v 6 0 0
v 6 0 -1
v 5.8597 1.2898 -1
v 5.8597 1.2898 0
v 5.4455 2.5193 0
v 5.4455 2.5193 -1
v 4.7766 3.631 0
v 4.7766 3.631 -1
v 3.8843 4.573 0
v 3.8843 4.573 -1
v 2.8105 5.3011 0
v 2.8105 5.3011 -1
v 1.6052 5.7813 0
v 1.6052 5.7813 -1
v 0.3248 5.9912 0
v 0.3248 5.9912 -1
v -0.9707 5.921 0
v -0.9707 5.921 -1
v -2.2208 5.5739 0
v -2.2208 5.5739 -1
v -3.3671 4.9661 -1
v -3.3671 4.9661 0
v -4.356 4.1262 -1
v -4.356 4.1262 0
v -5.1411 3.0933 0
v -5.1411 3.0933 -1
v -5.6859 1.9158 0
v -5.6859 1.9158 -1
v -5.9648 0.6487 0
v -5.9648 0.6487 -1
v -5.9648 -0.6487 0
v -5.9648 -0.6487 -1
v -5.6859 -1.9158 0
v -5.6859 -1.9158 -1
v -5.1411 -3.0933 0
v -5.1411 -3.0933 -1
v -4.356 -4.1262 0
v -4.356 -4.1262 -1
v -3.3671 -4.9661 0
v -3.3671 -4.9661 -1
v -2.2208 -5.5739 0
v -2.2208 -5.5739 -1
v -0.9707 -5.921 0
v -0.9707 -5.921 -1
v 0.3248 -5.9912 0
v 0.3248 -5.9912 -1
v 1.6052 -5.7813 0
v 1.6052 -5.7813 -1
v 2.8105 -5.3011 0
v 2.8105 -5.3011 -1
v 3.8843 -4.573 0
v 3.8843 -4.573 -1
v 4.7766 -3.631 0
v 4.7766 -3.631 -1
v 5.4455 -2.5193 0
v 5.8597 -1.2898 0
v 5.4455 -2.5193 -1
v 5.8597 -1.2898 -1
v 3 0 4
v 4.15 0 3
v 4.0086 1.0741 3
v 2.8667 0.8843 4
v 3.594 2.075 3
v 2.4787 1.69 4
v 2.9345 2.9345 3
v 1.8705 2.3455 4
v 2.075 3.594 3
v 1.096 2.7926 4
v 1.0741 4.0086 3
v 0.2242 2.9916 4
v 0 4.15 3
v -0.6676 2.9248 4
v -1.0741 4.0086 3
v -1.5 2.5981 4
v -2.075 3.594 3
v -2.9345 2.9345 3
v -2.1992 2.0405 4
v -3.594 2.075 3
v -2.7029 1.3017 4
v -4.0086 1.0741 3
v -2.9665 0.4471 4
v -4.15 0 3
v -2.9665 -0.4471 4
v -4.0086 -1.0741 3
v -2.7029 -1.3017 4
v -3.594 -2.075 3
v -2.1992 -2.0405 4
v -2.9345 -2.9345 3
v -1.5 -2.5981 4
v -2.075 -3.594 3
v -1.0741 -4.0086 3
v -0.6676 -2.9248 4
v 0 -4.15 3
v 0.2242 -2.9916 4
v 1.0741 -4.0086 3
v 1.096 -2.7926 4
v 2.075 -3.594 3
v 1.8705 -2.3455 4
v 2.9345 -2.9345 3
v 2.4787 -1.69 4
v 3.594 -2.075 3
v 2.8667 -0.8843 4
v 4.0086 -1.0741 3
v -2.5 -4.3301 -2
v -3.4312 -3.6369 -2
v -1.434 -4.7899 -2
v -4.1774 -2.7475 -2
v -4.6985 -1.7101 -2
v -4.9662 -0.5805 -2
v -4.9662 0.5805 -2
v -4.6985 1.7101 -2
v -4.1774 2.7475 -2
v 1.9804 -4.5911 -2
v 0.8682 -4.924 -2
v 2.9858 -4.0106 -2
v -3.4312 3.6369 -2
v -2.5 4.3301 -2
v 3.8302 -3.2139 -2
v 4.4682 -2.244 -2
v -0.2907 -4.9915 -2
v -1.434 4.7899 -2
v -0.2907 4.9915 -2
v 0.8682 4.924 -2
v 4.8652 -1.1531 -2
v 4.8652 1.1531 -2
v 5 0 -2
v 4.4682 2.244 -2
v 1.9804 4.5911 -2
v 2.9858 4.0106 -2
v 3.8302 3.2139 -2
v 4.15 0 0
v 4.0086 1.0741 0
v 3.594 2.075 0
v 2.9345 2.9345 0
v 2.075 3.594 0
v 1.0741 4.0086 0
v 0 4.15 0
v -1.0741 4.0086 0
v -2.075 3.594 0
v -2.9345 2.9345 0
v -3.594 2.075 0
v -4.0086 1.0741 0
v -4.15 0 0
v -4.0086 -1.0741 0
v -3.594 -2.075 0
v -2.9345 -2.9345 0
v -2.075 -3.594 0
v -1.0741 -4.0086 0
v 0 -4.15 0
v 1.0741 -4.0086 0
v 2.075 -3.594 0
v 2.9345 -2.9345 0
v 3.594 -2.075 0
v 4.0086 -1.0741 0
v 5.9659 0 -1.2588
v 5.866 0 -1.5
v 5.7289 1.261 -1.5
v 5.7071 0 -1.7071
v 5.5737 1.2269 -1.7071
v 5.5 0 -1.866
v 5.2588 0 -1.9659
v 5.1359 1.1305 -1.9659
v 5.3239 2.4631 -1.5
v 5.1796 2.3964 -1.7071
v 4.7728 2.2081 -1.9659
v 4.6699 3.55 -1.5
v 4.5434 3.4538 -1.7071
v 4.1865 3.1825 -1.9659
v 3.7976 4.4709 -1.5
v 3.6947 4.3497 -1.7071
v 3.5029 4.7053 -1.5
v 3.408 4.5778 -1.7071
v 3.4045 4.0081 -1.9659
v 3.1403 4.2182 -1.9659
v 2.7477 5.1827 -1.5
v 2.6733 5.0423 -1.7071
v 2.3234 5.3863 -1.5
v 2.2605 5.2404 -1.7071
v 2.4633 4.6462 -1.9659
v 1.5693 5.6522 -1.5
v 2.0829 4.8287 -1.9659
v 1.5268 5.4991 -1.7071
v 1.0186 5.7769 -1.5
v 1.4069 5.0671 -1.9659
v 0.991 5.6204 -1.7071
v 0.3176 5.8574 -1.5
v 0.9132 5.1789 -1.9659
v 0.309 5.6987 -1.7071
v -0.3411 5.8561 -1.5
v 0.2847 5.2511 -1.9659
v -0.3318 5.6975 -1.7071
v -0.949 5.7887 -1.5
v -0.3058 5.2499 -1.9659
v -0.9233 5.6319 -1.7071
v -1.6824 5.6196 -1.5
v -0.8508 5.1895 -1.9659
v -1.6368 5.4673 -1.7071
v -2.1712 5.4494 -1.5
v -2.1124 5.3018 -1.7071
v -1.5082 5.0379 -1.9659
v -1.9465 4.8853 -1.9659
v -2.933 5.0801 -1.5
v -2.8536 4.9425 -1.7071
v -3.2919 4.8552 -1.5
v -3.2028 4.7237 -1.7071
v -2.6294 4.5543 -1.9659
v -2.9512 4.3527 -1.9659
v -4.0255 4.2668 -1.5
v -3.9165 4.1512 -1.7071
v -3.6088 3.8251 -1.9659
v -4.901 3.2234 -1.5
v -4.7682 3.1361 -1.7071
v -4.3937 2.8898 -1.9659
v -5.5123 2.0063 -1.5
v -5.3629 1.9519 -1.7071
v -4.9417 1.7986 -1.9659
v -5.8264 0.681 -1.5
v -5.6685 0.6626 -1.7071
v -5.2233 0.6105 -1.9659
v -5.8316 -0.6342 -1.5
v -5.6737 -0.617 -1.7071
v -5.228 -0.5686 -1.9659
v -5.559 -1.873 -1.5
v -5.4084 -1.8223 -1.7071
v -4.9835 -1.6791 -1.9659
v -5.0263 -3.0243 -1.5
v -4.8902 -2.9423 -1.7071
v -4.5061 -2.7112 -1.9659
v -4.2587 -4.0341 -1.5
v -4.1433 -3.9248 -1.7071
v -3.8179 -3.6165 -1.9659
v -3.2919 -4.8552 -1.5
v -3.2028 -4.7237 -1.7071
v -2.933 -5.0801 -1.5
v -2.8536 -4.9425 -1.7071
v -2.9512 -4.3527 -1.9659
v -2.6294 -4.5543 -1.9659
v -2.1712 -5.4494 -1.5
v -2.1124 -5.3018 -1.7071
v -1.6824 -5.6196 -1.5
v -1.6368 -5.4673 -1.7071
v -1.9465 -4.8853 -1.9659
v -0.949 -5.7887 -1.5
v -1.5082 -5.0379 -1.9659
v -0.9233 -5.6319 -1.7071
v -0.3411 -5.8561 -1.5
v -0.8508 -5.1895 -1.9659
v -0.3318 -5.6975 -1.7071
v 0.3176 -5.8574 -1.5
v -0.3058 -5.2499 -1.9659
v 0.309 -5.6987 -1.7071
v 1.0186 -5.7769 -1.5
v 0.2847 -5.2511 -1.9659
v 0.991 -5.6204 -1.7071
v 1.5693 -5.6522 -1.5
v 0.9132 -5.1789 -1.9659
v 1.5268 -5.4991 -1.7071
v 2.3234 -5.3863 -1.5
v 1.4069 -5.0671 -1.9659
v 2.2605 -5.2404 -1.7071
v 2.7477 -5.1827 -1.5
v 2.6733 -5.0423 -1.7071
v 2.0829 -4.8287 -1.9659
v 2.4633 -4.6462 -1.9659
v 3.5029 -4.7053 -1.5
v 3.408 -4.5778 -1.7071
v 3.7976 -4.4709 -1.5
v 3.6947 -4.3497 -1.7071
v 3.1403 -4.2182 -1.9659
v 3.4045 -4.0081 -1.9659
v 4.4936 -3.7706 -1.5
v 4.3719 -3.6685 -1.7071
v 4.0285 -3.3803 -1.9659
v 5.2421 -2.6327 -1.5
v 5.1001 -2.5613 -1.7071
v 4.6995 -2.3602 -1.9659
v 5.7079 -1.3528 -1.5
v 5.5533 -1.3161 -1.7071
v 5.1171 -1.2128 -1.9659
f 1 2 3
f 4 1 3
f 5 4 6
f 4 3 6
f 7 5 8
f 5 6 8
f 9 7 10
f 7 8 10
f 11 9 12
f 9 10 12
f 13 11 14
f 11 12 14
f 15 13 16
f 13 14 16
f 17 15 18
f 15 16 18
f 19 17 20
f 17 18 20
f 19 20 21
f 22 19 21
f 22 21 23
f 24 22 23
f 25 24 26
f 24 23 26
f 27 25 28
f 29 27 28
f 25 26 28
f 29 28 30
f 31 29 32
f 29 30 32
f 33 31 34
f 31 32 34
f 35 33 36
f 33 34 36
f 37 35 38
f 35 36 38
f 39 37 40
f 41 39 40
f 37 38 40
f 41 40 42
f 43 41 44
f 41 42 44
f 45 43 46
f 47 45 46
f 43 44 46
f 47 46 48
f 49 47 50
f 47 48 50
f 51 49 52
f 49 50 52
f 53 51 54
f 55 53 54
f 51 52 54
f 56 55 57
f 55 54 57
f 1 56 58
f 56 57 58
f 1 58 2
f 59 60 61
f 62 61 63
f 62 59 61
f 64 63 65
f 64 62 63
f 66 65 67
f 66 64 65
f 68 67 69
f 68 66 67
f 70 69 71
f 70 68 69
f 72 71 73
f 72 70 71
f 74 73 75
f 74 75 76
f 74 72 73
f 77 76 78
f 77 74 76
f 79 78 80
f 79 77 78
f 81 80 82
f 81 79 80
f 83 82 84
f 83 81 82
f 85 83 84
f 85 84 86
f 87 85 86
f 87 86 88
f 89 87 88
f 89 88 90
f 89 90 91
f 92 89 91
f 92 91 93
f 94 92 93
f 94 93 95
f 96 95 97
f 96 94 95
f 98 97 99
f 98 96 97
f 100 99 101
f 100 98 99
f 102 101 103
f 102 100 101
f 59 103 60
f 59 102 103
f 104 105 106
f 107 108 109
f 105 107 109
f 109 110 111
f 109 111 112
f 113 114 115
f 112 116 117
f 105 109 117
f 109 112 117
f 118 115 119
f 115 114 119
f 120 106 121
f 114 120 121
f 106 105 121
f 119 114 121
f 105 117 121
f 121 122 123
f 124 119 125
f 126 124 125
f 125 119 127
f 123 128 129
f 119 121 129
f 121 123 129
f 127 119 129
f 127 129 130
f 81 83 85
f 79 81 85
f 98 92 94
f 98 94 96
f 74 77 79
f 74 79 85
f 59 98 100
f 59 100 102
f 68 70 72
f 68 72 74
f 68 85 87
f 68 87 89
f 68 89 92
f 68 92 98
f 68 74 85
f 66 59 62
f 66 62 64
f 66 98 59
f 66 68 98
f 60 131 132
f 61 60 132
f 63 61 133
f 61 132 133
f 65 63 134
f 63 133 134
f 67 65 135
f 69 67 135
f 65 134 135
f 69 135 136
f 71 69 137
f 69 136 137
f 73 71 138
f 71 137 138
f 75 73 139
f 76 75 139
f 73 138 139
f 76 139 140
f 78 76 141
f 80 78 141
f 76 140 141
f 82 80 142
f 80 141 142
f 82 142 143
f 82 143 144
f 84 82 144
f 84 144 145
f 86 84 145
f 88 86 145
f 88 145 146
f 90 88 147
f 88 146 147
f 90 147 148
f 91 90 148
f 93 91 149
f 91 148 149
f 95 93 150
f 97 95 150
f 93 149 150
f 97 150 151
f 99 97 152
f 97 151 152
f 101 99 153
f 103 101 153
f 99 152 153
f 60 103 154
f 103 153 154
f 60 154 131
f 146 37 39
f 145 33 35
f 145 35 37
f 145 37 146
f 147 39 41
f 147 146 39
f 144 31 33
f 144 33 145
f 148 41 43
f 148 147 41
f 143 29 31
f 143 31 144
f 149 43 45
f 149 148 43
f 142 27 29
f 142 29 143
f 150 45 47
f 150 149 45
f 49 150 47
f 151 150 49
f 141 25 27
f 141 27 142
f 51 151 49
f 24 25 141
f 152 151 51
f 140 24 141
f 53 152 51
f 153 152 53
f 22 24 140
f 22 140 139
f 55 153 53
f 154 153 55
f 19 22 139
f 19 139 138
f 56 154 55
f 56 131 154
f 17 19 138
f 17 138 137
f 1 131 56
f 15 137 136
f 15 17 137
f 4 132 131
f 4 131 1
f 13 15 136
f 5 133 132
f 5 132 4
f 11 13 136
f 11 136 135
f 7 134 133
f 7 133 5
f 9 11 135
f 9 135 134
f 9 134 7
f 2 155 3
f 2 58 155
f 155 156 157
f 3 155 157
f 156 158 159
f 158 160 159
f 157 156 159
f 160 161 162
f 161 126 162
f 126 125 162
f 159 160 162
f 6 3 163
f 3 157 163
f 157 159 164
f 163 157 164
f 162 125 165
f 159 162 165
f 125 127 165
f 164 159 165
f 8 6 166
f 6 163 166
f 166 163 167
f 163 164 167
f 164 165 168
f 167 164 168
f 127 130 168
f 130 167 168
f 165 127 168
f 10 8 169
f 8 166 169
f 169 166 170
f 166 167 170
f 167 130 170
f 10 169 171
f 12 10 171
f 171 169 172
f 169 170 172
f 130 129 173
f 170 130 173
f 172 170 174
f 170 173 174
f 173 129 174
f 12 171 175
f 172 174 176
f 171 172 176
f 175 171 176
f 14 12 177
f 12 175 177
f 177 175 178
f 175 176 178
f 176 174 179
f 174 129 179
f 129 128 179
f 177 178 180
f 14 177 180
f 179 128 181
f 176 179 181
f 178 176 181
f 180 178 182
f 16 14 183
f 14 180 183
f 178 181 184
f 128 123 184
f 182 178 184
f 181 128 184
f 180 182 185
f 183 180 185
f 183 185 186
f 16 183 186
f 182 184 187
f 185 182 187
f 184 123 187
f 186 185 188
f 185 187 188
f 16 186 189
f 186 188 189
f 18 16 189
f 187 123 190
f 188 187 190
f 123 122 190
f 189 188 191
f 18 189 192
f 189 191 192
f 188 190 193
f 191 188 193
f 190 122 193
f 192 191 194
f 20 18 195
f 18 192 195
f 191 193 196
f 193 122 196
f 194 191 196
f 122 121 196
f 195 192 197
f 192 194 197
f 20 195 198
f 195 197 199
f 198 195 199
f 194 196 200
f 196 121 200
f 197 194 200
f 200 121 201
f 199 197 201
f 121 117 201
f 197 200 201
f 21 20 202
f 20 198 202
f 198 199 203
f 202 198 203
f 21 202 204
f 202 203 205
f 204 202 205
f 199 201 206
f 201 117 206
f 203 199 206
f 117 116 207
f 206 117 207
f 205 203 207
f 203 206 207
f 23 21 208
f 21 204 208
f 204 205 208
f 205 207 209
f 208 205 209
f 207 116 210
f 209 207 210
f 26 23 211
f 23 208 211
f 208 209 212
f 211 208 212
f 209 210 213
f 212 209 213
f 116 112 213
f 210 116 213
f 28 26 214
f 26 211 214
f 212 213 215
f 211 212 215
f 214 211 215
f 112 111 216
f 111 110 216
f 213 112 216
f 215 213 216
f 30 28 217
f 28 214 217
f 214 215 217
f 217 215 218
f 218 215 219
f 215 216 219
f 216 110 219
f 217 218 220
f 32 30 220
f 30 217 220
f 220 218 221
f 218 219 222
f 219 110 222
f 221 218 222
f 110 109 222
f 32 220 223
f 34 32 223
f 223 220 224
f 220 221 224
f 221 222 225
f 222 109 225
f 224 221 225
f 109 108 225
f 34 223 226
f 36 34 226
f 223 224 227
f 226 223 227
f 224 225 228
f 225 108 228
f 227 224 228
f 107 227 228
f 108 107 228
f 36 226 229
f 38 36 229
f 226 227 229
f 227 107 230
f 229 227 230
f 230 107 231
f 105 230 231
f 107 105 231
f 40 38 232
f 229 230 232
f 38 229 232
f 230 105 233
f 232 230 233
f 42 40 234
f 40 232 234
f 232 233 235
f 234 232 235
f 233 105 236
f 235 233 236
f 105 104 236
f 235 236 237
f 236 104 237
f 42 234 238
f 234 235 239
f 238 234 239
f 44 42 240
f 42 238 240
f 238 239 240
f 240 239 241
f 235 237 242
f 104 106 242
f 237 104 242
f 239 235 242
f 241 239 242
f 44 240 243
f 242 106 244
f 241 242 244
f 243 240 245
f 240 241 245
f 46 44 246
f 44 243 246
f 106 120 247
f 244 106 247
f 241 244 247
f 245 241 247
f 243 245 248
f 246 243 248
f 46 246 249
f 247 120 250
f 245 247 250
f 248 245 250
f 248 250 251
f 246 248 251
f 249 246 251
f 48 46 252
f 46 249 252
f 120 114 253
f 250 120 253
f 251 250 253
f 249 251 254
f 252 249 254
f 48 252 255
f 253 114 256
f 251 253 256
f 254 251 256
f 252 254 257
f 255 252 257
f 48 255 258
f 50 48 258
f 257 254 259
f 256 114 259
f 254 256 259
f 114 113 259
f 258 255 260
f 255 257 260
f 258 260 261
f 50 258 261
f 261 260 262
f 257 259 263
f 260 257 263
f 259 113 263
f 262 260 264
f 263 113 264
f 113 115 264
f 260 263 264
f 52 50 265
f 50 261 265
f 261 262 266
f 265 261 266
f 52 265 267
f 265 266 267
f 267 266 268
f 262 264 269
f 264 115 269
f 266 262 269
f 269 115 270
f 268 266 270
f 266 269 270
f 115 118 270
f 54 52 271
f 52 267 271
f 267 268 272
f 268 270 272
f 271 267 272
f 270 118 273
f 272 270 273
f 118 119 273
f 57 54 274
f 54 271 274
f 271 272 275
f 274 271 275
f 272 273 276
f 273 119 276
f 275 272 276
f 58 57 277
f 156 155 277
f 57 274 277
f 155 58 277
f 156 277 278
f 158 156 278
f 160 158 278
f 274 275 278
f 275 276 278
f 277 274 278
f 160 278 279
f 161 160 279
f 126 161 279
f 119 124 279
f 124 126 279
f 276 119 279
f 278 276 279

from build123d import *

# Parameters (mm, degrees)
CYLINDER_R        = 4.15
CYLINDER_DEPTH    = 3
CYLINDER001_R     = 6
CYLINDER001_DEPTH = 2
FILLET_R          = 1


with BuildPart() as cylinder:
    # Cylinder → Cylinder (new body)
    with BuildSketch(Plane.XY):
        Circle(CYLINDER_R)
    extrude(amount=CYLINDER_DEPTH)


with BuildPart() as cone:
    # Cone → Cone (revolve)
    with BuildSketch(Plane(origin=(0, 0, 3), x_dir=(1, 0, 0), z_dir=(0, -1, 0))):
        Polygon((0, 0), (4.15, 0), (3, 1), (0, 1), align=None)
    revolve(axis=Axis((0, 0, 3), (0, 0, 1)))


with BuildPart() as fusion:
    # Cylinder001 → Cylinder001 (new body)
    with BuildSketch(Plane.XY.offset(-2)):
        Circle(CYLINDER001_R)
    extrude(amount=CYLINDER001_DEPTH)

    # Fillet
    fillet_edges = [fusion.edges().sort_by_distance(p)[0] for p in [
        (-6, 0, -2),
    ]]
    fillet(fillet_edges, radius=FILLET_R)

    # Fusion: union Cylinder, Cone
    add(cylinder.part)
    add(cone.part)


solid = fusion.part
